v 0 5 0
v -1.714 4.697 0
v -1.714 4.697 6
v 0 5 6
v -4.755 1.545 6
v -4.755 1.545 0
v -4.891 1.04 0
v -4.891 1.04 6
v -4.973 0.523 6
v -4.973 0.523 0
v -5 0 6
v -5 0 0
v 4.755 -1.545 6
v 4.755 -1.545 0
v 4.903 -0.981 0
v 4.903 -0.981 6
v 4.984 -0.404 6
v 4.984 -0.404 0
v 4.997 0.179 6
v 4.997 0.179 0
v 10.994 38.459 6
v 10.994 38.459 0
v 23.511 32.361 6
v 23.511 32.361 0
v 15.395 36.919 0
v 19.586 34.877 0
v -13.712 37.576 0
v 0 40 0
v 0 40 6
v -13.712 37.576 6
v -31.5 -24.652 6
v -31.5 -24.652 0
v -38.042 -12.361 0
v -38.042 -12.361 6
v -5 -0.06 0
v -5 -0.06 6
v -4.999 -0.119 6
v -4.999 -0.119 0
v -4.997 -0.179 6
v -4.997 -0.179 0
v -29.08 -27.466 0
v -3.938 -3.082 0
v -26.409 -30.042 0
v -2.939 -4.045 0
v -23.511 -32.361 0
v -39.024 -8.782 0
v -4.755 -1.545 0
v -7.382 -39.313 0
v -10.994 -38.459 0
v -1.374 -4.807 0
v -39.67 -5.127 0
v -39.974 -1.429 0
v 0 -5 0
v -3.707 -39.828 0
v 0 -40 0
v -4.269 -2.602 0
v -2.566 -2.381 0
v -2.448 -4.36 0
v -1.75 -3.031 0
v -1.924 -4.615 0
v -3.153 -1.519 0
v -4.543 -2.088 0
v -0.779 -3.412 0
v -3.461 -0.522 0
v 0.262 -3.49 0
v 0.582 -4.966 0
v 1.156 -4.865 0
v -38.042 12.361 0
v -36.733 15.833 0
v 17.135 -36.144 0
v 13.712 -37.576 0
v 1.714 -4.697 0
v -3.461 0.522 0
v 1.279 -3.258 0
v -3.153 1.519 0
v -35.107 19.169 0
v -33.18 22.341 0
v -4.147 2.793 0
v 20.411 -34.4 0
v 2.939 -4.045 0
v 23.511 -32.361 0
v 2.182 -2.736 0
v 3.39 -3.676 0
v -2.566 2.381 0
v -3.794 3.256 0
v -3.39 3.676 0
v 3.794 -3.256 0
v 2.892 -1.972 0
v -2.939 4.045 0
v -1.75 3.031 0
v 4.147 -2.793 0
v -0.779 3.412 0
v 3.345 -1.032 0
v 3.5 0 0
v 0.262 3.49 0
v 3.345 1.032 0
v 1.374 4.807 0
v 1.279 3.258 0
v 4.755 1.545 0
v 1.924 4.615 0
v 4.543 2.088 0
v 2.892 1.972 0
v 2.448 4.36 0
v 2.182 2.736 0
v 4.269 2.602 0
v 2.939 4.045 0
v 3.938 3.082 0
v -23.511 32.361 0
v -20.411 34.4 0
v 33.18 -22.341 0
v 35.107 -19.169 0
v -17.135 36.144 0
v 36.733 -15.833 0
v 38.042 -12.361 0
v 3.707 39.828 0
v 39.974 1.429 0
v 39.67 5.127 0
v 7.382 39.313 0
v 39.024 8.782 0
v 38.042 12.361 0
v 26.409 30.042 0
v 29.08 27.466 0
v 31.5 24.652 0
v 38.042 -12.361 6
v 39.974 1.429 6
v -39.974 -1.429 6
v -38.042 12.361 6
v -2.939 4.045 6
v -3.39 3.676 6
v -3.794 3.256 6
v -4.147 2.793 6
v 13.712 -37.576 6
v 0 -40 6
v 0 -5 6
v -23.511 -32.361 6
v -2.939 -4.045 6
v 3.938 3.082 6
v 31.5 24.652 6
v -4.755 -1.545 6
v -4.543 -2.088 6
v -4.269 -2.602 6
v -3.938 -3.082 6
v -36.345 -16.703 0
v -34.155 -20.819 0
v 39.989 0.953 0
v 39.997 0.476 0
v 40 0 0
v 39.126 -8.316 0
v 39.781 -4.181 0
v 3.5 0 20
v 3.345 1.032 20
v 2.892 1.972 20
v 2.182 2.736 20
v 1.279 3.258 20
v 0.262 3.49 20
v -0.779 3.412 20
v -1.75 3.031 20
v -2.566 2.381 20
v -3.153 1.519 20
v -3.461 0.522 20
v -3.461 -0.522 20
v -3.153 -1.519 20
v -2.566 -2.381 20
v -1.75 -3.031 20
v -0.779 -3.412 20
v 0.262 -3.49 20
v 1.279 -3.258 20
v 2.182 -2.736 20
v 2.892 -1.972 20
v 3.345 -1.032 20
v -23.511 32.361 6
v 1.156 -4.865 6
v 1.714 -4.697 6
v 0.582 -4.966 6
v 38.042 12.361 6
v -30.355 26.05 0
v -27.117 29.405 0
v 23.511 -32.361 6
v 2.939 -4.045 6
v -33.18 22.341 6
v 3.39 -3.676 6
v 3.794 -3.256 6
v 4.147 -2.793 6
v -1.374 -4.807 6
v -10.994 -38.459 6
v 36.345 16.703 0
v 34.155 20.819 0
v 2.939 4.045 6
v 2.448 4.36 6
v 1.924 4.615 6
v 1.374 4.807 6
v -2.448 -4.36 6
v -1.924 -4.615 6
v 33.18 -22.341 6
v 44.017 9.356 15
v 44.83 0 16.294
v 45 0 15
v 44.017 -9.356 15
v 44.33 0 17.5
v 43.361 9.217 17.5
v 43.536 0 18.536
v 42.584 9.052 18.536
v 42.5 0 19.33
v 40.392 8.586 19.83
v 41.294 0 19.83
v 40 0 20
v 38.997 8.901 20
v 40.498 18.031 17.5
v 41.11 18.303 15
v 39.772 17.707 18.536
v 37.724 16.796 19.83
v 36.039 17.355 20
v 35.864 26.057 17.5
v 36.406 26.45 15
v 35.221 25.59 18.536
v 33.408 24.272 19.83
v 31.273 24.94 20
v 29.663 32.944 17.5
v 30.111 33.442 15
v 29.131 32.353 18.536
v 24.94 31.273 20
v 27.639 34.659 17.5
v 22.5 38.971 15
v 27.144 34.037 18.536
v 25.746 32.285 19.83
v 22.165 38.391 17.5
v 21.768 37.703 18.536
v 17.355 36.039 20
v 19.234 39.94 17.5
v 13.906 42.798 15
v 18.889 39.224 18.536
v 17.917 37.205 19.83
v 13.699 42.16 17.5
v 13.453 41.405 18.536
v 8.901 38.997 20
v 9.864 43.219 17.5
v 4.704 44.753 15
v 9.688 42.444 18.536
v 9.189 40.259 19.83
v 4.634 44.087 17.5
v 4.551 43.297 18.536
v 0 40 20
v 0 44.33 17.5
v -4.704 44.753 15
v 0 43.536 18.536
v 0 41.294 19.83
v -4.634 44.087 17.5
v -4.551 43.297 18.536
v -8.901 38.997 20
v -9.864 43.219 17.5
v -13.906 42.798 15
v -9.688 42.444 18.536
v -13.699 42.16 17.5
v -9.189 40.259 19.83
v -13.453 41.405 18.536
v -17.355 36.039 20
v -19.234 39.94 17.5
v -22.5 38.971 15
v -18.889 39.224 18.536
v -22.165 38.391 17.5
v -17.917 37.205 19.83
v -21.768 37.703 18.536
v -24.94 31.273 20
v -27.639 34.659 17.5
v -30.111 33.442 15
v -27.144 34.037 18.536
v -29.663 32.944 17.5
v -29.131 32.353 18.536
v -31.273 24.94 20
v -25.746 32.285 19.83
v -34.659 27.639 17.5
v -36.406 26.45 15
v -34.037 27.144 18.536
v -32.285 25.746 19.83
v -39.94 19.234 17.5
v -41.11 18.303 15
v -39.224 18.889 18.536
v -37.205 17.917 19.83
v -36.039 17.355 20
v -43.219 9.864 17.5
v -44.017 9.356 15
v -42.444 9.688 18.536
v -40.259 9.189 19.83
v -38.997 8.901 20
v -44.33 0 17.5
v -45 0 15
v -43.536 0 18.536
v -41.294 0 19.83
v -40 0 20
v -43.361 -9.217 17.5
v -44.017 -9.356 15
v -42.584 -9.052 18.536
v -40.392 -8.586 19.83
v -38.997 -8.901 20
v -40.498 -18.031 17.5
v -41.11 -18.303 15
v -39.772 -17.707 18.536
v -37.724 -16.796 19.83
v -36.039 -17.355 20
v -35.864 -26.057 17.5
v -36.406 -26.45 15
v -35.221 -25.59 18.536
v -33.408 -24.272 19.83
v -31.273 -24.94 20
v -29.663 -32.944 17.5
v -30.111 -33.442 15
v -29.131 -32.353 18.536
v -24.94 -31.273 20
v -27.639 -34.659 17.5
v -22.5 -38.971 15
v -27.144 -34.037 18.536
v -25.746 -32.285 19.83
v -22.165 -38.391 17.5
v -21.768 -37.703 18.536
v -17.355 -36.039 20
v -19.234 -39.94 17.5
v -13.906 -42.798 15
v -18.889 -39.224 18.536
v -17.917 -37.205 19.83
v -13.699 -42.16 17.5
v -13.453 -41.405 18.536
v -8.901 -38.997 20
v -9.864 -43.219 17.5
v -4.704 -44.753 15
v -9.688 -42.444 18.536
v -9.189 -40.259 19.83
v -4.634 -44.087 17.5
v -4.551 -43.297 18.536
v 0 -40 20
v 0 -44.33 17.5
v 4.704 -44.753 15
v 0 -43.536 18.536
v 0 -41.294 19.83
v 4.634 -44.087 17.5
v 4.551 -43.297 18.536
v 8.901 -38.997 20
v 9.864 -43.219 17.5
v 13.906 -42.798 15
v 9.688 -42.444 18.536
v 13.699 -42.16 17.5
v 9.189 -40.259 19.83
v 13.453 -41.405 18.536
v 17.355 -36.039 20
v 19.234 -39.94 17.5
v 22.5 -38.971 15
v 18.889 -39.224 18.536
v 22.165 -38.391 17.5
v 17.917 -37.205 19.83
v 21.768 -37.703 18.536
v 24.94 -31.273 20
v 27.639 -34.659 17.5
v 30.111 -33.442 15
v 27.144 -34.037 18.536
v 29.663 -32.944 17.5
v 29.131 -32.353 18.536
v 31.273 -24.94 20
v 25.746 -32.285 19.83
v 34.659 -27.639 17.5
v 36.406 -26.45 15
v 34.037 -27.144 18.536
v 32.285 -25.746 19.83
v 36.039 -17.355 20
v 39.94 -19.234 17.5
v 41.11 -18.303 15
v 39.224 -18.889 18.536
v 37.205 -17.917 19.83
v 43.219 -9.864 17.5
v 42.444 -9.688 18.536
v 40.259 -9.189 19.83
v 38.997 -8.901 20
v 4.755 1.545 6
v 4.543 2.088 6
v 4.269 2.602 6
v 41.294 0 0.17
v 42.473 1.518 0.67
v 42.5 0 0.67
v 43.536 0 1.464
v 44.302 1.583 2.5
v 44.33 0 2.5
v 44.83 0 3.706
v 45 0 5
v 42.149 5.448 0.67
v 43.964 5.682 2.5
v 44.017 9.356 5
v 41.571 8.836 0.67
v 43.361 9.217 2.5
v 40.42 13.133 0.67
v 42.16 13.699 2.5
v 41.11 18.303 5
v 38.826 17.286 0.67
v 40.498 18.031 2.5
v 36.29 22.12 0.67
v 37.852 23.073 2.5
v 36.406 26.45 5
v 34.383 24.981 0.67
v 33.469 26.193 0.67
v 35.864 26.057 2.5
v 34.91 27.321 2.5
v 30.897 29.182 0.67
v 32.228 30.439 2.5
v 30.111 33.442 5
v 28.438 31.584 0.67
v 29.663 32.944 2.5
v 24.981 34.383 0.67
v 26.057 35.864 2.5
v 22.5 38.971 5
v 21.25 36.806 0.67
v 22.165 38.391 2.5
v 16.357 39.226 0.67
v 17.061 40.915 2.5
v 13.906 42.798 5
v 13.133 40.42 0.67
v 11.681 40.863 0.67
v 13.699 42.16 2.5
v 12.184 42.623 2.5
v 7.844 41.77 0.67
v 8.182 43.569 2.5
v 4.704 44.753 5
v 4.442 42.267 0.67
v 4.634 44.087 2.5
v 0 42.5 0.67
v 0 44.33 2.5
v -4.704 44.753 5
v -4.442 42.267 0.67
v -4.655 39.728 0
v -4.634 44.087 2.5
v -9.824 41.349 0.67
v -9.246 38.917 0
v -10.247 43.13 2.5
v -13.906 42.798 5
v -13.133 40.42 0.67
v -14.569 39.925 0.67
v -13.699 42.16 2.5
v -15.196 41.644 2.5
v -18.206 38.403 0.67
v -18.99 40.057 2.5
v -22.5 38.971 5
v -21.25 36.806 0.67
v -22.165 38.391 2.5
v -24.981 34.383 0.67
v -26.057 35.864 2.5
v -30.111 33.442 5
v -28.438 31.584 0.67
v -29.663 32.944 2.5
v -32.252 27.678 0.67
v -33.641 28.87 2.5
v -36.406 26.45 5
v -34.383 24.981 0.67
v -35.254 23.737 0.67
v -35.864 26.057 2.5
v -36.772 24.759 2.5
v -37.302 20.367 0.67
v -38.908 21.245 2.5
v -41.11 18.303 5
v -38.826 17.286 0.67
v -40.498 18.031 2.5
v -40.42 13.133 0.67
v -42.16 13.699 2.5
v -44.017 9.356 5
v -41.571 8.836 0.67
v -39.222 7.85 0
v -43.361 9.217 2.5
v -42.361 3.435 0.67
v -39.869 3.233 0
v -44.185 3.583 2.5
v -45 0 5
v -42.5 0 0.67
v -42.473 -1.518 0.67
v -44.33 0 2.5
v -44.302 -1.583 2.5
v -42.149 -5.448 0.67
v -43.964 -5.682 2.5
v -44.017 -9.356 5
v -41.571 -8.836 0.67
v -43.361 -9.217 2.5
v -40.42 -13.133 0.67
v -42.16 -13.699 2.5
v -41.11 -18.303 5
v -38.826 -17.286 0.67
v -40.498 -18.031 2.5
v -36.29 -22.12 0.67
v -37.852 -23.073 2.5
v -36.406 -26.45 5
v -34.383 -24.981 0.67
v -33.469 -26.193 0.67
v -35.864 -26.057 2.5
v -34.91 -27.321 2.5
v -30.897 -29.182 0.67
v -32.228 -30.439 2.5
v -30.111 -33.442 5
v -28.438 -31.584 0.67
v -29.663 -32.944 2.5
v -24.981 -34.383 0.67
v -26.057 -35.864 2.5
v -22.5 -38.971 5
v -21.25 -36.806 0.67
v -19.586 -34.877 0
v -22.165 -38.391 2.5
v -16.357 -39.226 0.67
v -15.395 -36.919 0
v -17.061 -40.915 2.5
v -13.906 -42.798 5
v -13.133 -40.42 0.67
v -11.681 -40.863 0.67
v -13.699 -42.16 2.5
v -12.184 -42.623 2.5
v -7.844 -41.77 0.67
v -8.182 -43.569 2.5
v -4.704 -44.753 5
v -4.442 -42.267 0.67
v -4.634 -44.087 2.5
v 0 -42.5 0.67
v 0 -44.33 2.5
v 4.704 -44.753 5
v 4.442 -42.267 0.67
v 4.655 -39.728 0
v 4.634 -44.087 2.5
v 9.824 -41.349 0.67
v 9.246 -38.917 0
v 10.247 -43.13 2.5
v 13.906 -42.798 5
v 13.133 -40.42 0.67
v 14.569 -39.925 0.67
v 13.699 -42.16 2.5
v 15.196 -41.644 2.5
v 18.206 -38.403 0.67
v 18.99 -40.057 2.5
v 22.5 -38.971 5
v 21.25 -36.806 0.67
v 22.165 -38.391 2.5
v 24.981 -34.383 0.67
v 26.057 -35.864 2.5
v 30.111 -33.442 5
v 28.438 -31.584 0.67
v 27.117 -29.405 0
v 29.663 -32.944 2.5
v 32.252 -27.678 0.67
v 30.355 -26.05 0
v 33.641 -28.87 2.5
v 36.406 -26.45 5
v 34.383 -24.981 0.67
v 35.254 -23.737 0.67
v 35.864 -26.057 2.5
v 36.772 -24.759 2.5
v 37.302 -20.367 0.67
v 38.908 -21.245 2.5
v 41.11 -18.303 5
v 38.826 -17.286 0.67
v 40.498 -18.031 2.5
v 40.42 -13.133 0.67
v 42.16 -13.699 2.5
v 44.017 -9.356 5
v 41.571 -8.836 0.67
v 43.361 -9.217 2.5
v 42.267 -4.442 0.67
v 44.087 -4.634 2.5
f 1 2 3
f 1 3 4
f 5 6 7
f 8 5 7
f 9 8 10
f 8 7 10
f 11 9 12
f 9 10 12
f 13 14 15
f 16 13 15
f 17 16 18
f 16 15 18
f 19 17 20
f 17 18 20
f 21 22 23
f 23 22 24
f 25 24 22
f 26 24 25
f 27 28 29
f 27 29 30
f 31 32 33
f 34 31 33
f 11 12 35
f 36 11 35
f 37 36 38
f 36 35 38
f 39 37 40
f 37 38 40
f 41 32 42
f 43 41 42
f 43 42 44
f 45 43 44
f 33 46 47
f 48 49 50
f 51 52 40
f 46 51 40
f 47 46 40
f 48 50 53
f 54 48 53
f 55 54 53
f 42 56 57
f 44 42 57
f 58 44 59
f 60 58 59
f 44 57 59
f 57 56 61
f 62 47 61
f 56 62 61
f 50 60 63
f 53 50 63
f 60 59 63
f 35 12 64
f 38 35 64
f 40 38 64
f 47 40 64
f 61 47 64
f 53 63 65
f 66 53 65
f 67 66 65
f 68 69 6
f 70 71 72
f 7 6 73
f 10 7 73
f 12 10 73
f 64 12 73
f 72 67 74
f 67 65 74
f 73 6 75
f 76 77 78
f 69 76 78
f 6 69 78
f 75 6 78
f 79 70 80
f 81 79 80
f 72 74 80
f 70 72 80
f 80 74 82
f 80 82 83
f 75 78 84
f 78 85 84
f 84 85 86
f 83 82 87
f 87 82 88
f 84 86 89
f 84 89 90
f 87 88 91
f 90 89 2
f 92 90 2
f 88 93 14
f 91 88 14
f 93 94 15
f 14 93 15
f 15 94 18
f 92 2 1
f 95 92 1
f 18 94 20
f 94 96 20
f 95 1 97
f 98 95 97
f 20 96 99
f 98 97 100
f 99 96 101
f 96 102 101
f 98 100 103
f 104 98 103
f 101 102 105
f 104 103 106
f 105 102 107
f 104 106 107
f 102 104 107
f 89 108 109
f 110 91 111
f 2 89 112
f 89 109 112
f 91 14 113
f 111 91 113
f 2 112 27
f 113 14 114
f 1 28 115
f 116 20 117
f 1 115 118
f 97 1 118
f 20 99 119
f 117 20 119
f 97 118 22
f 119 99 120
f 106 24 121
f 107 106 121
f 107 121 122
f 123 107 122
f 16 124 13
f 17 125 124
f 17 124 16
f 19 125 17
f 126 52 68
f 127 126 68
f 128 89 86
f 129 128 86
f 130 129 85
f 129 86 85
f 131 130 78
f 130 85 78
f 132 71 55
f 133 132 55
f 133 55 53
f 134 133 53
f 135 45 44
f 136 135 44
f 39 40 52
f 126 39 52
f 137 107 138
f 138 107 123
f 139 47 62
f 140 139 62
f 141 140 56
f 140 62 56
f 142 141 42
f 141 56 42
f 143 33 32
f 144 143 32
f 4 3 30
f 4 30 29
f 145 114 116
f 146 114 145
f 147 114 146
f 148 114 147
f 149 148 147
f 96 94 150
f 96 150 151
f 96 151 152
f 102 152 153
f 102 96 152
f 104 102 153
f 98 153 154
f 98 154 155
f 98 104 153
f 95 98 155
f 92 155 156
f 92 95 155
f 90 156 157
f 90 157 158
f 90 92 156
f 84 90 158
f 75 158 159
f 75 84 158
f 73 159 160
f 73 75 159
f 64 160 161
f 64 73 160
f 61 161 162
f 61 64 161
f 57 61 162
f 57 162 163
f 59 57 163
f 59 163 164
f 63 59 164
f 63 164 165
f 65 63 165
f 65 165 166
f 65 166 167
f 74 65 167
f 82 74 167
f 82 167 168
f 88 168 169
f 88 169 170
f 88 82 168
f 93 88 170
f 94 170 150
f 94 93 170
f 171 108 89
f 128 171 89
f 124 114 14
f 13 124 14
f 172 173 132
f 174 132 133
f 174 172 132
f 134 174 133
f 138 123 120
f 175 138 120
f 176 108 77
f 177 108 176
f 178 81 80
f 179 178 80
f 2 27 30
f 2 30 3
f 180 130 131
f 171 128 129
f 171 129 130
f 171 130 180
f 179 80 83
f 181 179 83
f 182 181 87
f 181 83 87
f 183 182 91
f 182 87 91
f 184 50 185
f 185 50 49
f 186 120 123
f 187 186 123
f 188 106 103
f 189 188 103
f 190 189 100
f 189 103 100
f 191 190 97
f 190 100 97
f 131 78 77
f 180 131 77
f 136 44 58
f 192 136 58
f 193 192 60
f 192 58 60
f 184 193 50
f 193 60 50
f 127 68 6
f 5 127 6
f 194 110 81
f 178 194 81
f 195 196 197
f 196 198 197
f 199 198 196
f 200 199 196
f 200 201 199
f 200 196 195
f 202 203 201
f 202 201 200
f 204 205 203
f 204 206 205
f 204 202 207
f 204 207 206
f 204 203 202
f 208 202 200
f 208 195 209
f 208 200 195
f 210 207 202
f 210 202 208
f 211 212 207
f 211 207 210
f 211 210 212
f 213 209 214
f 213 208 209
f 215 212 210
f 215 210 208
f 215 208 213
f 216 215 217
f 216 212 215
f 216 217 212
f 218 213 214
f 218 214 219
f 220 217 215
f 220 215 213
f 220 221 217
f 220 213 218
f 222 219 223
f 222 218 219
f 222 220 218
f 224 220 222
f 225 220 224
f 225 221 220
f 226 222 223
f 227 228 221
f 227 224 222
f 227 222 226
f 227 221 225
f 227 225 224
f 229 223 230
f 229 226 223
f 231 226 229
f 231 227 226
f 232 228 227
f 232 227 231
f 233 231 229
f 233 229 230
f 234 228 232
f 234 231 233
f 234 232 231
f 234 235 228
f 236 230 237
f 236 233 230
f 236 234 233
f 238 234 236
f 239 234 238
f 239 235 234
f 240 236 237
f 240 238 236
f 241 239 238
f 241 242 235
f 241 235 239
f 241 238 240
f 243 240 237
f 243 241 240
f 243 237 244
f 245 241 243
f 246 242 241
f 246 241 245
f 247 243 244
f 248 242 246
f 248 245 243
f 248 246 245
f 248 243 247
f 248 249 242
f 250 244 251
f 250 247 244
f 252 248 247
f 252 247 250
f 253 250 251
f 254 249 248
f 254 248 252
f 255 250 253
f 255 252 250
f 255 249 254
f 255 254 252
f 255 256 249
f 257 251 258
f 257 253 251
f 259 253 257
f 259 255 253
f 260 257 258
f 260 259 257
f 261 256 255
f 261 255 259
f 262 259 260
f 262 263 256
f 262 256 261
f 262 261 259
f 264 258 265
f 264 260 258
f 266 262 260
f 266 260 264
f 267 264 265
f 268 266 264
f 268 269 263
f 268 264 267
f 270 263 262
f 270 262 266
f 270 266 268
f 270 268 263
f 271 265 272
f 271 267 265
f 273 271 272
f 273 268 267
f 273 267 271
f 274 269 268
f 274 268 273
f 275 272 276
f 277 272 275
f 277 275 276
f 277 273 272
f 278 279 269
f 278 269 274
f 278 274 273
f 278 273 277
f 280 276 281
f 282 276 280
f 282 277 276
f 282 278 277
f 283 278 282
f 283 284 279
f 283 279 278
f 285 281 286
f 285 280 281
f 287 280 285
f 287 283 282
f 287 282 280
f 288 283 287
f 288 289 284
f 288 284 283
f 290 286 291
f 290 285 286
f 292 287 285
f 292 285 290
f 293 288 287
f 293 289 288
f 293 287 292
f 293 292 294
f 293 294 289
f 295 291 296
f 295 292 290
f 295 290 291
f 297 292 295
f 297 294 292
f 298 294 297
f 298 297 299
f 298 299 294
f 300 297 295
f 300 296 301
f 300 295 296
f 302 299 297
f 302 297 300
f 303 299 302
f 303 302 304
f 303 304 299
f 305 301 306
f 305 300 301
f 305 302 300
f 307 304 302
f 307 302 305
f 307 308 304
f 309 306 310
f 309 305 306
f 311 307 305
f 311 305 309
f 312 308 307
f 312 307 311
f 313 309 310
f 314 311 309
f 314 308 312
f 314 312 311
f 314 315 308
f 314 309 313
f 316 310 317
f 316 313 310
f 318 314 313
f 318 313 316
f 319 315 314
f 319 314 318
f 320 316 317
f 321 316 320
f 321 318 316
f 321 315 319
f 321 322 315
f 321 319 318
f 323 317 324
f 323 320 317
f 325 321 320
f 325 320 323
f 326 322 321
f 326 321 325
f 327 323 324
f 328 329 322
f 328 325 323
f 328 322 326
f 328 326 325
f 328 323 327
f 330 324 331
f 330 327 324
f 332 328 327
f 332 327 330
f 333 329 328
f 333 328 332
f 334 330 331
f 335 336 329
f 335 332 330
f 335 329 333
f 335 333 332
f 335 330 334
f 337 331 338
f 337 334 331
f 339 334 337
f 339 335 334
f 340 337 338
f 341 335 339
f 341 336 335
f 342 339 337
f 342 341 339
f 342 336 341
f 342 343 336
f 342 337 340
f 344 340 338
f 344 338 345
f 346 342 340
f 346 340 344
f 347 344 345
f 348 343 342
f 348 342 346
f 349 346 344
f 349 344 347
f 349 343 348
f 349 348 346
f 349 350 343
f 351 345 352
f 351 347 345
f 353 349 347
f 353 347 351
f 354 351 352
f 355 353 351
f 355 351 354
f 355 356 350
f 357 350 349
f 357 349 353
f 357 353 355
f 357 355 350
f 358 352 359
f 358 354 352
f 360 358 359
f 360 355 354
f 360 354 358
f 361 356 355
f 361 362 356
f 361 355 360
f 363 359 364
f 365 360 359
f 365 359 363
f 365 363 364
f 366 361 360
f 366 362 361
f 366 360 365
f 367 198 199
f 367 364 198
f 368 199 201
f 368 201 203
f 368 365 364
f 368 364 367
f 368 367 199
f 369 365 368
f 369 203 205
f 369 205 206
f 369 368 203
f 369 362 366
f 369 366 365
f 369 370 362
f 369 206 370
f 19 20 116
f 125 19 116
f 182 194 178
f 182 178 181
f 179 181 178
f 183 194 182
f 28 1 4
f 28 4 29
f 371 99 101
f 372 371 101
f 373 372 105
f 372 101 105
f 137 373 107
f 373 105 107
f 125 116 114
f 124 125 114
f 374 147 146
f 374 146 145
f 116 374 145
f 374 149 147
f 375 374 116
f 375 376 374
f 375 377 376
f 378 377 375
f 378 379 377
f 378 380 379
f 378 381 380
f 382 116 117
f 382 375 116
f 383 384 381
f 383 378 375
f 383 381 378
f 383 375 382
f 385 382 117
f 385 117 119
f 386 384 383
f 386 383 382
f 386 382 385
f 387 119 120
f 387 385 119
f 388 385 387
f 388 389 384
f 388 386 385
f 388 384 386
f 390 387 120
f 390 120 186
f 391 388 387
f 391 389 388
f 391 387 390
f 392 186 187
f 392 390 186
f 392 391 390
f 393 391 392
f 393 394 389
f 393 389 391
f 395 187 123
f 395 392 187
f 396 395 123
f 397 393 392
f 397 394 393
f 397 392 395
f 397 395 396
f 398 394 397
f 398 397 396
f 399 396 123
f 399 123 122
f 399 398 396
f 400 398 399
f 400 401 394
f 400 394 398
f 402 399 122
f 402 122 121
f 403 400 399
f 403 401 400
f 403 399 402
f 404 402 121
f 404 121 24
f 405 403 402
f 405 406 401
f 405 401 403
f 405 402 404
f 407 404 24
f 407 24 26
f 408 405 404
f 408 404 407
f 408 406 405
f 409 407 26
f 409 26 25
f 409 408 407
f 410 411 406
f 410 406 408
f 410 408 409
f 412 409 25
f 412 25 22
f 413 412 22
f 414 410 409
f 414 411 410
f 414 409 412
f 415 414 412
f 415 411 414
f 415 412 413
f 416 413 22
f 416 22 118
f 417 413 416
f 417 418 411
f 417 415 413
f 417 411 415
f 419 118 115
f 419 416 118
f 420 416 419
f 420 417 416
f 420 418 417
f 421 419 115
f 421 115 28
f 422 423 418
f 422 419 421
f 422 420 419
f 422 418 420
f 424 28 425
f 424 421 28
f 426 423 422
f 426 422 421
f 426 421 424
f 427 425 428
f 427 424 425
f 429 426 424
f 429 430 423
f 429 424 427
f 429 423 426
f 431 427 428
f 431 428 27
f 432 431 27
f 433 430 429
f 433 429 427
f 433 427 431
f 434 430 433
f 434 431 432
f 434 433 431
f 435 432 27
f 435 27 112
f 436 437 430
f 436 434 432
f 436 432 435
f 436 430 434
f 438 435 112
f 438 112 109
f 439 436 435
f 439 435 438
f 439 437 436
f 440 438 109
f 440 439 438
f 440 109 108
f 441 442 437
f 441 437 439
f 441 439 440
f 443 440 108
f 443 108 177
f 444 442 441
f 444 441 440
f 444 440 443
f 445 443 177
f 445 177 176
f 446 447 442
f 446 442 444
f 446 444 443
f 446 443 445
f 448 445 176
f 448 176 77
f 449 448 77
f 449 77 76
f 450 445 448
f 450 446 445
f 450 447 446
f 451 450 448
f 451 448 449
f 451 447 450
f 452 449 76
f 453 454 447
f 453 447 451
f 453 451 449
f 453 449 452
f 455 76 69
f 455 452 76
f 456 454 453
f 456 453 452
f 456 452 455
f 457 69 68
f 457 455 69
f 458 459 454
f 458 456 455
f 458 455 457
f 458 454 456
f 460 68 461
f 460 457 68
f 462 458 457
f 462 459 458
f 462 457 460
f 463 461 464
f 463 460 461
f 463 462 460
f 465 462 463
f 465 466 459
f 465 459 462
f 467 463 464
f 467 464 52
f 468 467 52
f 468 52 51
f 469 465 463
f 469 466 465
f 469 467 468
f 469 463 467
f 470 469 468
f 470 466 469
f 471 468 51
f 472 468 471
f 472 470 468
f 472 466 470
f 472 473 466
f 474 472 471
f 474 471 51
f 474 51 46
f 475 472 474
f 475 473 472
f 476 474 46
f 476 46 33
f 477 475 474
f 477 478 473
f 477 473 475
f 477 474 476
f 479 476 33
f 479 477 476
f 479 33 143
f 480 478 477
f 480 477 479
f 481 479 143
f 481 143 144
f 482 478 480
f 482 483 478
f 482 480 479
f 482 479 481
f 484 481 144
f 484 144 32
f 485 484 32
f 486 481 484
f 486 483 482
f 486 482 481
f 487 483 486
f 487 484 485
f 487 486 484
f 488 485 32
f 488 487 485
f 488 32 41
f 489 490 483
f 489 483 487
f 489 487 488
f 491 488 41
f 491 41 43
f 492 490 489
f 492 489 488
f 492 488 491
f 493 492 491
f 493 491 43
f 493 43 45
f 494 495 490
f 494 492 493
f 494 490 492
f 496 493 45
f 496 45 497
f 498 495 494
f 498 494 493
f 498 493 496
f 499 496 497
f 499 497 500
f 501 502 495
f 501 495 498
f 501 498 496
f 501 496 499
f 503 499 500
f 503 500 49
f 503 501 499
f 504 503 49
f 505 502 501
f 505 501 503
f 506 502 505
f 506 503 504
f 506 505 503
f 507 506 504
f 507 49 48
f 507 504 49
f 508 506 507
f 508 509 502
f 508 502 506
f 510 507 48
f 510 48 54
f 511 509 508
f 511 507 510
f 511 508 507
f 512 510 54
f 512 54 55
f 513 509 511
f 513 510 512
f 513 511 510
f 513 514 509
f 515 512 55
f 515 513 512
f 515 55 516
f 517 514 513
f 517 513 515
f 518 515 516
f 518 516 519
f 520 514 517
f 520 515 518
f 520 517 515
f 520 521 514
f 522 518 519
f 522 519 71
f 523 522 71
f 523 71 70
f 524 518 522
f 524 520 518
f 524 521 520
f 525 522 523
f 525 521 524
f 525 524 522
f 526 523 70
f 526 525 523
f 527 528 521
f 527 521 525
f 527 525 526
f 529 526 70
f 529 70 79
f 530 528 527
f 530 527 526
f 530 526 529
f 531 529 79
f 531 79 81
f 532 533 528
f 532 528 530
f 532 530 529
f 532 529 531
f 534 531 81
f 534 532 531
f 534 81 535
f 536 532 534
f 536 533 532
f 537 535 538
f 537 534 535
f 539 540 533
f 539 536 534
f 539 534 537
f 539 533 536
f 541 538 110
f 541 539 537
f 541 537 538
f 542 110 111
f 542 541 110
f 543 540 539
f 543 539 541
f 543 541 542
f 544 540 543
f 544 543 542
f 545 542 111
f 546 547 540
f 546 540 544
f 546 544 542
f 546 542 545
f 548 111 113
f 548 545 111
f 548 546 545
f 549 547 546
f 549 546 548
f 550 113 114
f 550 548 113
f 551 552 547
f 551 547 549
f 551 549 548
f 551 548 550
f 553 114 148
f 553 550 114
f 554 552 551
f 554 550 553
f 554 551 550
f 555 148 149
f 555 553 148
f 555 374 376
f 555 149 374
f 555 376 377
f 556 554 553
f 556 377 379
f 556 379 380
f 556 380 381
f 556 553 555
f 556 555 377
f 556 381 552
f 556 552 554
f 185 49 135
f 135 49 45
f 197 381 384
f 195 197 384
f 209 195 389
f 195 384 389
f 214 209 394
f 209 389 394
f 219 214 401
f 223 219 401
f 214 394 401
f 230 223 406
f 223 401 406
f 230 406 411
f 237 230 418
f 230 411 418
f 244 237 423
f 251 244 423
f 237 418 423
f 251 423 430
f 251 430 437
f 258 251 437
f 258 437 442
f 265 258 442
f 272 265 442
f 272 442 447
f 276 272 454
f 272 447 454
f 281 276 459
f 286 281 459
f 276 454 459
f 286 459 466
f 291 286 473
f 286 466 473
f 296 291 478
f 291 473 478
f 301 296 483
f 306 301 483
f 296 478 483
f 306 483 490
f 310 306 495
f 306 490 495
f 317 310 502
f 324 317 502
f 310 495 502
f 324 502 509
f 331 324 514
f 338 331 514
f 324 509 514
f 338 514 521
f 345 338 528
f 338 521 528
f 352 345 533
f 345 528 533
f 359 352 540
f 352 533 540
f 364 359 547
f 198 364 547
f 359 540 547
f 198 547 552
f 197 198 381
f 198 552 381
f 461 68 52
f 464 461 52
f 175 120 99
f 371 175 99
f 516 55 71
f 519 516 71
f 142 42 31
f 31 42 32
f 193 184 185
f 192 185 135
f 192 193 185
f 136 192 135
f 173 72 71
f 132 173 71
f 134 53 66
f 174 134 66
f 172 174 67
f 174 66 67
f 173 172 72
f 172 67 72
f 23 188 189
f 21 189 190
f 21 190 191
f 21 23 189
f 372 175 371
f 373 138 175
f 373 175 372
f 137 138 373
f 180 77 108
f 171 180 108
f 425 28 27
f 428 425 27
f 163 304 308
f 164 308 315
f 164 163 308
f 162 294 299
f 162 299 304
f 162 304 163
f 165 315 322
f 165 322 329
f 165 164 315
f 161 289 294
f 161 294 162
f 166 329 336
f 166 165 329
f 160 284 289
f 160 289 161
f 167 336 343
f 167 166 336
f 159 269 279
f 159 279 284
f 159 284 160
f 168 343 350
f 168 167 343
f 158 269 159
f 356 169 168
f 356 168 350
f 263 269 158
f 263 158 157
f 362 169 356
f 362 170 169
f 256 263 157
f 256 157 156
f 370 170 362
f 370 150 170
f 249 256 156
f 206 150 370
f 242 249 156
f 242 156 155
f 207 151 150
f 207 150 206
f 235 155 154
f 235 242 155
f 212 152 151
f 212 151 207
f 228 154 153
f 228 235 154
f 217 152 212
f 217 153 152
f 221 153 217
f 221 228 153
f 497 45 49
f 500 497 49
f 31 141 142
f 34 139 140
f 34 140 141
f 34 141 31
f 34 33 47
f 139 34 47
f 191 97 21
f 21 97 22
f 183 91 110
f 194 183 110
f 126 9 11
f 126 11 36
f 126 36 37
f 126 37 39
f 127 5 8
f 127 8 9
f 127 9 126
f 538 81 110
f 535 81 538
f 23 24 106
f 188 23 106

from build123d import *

# Parameters (mm, degrees)
SKETCH1_R           = 45
SKETCH1_R_2         = 42.5
SKETCH1_R_3         = 3.5
BOSS_EXTRUDE1_DEPTH = 20
FILLET1_R           = 5
FILLET2_R           = 5
CUT_EXTRUDE2_DEPTH  = 6


with BuildPart() as part:
    # Sketch1 → Boss-Extrude1 (new body)
    # profile 1 of 2: a face of its own
    with BuildSketch(Plane.XY):
        Circle(SKETCH1_R)
        Circle(SKETCH1_R_2, mode=Mode.SUBTRACT)
    # profile 2 of 2: a face of its own
    with BuildSketch(Plane.XY):
        Circle(SKETCH1_R_2)
        Circle(SKETCH1_R_3, mode=Mode.SUBTRACT)
    extrude(amount=BOSS_EXTRUDE1_DEPTH)

    # Fillet1
    fillet1_edges = [part.edges().sort_by_distance(p)[0] for p in [
        (-45, 0, 0),
    ]]
    fillet(fillet1_edges, radius=FILLET1_R)

    # Fillet2
    fillet2_edges = [part.edges().sort_by_distance(p)[0] for p in [
        (-45, 0, 20),
    ]]
    fillet(fillet2_edges, radius=FILLET2_R)

    # Sketch2 → Cut-Extrude2 (cut)
    with BuildSketch(Plane(origin=(0, 0, 0), x_dir=(-1, 0, 0), z_dir=(0, 0, -1))):
        with BuildLine():
            Line((38.042260652, 12.360679775), (4.755282581, 1.545084972))
            ThreePointArc((4.755282581, 1.545084972), (4.938441703, 0.782172325), (5, 0))
            ThreePointArc((5, 0), (4.999202336, -0.08930847), (4.996809599, -0.178588445))
            Line((4.996809599, -0.178588445), (39.974476791, -1.42870756))
            Line((39.974476791, -1.42870756), (38.042260652, 12.360679775))
        make_face()
        with BuildLine():
            Line((38.042260652, -12.360679775), (4.755282581, -1.545084972))
            ThreePointArc((4.755282581, -1.545084972), (4.4137767, -2.349164796), (3.937532229, -3.081532078))
            Line((3.937532229, -3.081532078), (31.500257831, -24.652256622))
            Line((31.500257831, -24.652256622), (38.042260652, -12.360679775))
        make_face()
        with BuildLine():
            Line((23.511410092, -32.360679775), (2.938926261, -4.045084972))
            ThreePointArc((2.938926261, -4.045084972), (2.190015937, -4.494867094), (1.374251379, -4.807435194))
            Line((1.374251379, -4.807435194), (10.994011035, -38.459481554))
            Line((10.994011035, -38.459481554), (23.511410092, -32.360679775))
        make_face()
        with BuildLine():
            ThreePointArc((0, -5), (-0.870256478, -4.923682937), (-1.713946788, -4.697061465))
            Line((-1.713946788, -4.697061465), (-13.711574304, -37.576491721))
            Line((-13.711574304, -37.576491721), (0, -40))
            Line((0, -40), (0, -5))
        make_face()
        with BuildLine():
            ThreePointArc((-2.938926261, -4.045084972), (-3.598120497, -3.471819248), (-4.147475537, -2.792569904))
            Line((-4.147475537, -2.792569904), (-33.179804299, -22.34055923))
            Line((-33.179804299, -22.34055923), (-23.511410092, -32.360679775))
            Line((-23.511410092, -32.360679775), (-2.938926261, -4.045084972))
        make_face()
        with BuildLine():
            ThreePointArc((-4.755282581, -1.545084972), (-4.951624782, -0.693838608), (-4.996809599, 0.178588445))
            Line((-4.996809599, 0.178588445), (-39.974476791, 1.42870756))
            Line((-39.974476791, 1.42870756), (-38.042260652, -12.360679775))
            Line((-38.042260652, -12.360679775), (-4.755282581, -1.545084972))
        make_face()
        with BuildLine():
            ThreePointArc((-4.755282581, 1.545084972), (-4.4137767, 2.349164796), (-3.937532229, 3.081532078))
            Line((-3.937532229, 3.081532078), (-31.500257831, 24.652256622))
            Line((-31.500257831, 24.652256622), (-38.042260652, 12.360679775))
            Line((-38.042260652, 12.360679775), (-4.755282581, 1.545084972))
        make_face()
        with BuildLine():
            ThreePointArc((-2.938926261, 4.045084972), (-2.190015937, 4.494867094), (-1.374251379, 4.807435194))
            Line((-1.374251379, 4.807435194), (-10.994011035, 38.459481554))
            Line((-10.994011035, 38.459481554), (-23.511410092, 32.360679775))
            Line((-23.511410092, 32.360679775), (-2.938926261, 4.045084972))
        make_face()
        with BuildLine():
            Line((23.511410092, 32.360679775), (2.938926261, 4.045084972))
            ThreePointArc((2.938926261, 4.045084972), (3.598120497, 3.471819248), (4.147475537, 2.792569904))
            Line((4.147475537, 2.792569904), (33.179804299, 22.34055923))
            Line((33.179804299, 22.34055923), (23.511410092, 32.360679775))
        make_face()
        Polygon((13.711574304, 37.576491721), (1.713946788, 4.697061465), (0, 5), (0, 40), align=None)
    extrude(amount=-CUT_EXTRUDE2_DEPTH, mode=Mode.SUBTRACT)


solid = part.part
